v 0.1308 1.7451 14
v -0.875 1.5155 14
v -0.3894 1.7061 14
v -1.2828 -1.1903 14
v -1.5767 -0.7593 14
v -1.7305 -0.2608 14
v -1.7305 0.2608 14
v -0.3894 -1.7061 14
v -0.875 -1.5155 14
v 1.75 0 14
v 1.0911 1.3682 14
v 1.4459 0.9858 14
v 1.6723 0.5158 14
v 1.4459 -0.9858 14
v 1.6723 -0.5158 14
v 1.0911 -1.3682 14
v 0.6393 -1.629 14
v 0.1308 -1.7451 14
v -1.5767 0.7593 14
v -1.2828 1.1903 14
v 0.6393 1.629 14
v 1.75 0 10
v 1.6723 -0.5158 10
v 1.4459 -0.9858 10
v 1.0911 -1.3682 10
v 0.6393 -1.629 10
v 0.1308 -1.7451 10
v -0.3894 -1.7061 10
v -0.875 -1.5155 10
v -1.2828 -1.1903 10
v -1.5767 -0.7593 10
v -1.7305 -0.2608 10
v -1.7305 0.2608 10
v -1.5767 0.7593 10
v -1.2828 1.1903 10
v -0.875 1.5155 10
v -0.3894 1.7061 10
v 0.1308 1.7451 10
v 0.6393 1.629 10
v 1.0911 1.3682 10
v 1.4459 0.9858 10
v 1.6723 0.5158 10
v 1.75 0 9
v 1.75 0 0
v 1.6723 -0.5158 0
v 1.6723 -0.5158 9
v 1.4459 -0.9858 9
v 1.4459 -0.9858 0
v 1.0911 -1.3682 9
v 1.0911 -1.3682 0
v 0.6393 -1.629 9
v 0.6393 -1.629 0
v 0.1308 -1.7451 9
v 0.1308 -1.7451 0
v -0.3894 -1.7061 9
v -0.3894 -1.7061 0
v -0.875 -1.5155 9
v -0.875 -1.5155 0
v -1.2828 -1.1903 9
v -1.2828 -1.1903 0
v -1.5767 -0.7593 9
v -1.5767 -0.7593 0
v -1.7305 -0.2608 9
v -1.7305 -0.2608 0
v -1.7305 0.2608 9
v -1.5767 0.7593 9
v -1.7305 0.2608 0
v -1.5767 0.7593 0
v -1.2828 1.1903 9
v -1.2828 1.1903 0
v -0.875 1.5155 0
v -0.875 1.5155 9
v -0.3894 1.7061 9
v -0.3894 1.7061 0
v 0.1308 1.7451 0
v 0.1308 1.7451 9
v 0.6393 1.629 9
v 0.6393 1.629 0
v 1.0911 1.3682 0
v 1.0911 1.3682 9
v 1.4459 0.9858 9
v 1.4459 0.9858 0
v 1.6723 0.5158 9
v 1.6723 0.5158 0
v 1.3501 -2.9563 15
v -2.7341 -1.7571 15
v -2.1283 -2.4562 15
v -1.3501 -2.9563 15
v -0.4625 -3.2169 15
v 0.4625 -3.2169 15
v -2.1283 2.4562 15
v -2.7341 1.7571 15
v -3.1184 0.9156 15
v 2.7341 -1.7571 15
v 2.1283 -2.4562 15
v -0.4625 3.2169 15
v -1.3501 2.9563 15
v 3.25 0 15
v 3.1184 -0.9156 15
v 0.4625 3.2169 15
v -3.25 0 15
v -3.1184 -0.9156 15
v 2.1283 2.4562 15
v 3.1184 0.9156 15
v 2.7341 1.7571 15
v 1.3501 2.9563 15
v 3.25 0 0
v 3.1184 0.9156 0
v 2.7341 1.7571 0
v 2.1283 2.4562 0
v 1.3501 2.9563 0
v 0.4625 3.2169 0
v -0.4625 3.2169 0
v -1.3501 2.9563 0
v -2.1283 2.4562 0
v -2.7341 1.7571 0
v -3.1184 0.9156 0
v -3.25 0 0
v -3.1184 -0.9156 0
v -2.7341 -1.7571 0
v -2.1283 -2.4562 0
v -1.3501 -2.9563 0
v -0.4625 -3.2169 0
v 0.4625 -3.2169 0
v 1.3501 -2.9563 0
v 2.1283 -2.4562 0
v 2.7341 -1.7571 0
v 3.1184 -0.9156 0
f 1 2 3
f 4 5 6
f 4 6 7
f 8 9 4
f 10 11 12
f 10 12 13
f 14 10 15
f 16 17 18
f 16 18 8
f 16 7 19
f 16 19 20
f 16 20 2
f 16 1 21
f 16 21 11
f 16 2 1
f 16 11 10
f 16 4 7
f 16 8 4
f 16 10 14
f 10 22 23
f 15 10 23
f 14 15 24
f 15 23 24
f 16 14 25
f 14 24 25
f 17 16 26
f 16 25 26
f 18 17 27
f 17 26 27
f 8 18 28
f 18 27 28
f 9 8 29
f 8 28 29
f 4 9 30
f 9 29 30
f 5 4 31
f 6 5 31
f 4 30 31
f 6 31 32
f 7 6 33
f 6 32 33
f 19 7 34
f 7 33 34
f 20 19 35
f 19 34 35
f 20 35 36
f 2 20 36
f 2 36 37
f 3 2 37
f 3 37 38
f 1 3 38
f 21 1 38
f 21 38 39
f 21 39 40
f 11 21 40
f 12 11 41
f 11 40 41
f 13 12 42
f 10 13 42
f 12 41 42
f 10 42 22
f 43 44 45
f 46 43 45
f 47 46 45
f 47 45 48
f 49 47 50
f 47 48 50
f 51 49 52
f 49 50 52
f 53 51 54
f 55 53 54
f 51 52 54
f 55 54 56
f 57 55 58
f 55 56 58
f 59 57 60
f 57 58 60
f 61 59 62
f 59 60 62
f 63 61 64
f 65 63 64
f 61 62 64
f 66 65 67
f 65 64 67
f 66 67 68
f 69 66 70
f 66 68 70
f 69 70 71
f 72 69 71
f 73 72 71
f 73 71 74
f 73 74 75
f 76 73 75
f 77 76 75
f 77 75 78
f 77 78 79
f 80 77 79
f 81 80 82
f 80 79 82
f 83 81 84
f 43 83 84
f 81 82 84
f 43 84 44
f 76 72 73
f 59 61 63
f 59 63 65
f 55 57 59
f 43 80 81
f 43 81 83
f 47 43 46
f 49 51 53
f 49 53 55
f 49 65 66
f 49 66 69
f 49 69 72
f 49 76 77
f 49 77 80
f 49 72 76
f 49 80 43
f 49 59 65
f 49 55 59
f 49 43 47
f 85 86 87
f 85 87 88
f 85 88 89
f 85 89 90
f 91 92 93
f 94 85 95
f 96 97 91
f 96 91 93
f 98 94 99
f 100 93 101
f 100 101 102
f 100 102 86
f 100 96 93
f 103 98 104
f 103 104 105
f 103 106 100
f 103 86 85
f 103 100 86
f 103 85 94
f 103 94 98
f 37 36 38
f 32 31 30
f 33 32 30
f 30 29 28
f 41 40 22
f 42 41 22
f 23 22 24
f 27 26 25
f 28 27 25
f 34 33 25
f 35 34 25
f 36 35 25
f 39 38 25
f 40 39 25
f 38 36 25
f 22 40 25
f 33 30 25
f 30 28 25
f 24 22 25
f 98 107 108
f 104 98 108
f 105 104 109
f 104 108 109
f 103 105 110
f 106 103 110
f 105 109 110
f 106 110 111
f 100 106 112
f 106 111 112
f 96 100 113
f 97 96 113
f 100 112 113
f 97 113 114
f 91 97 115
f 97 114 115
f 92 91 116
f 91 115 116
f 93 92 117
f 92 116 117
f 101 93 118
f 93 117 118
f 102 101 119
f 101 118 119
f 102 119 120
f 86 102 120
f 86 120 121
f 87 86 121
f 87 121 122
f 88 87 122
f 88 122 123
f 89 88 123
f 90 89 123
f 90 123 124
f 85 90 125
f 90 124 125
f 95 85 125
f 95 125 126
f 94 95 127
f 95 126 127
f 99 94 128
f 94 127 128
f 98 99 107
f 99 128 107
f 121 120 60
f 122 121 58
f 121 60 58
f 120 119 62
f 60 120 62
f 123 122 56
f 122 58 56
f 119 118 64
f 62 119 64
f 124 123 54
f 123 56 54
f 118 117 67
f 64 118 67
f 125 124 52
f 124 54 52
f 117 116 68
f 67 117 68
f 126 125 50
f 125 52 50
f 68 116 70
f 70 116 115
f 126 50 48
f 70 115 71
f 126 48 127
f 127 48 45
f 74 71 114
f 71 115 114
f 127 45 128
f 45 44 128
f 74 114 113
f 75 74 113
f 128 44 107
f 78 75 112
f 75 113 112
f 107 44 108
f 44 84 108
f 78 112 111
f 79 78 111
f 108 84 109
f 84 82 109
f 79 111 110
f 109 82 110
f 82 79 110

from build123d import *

# Parameters (mm, degrees)
F0_R     = 3.25
F1_DEPTH = 15
F2_R     = 1.75
F3_DEPTH = 9
F5_R     = 1.75
F6_DEPTH = 4


with BuildPart() as f1:
    # F0 (on Top) → F1 (new body)
    with BuildSketch(Plane.XY):
        Circle(F0_R)
    extrude(amount=F1_DEPTH)

    # F2 (on face) → F3 (cut)
    with BuildSketch(Plane(origin=(0, 0, 0), x_dir=(1, 0, 0), z_dir=(0, 0, -1))):
        Circle(F2_R)
    extrude(amount=-F3_DEPTH, mode=Mode.SUBTRACT)

    # F5 (on offset) → F6 (cut)
    with BuildSketch(Plane(origin=(0, 0, 10), x_dir=(1, 0, 0), z_dir=(0, 0, -1))):
        Circle(F5_R)
    extrude(amount=-F6_DEPTH, mode=Mode.SUBTRACT)


solid = f1.part
